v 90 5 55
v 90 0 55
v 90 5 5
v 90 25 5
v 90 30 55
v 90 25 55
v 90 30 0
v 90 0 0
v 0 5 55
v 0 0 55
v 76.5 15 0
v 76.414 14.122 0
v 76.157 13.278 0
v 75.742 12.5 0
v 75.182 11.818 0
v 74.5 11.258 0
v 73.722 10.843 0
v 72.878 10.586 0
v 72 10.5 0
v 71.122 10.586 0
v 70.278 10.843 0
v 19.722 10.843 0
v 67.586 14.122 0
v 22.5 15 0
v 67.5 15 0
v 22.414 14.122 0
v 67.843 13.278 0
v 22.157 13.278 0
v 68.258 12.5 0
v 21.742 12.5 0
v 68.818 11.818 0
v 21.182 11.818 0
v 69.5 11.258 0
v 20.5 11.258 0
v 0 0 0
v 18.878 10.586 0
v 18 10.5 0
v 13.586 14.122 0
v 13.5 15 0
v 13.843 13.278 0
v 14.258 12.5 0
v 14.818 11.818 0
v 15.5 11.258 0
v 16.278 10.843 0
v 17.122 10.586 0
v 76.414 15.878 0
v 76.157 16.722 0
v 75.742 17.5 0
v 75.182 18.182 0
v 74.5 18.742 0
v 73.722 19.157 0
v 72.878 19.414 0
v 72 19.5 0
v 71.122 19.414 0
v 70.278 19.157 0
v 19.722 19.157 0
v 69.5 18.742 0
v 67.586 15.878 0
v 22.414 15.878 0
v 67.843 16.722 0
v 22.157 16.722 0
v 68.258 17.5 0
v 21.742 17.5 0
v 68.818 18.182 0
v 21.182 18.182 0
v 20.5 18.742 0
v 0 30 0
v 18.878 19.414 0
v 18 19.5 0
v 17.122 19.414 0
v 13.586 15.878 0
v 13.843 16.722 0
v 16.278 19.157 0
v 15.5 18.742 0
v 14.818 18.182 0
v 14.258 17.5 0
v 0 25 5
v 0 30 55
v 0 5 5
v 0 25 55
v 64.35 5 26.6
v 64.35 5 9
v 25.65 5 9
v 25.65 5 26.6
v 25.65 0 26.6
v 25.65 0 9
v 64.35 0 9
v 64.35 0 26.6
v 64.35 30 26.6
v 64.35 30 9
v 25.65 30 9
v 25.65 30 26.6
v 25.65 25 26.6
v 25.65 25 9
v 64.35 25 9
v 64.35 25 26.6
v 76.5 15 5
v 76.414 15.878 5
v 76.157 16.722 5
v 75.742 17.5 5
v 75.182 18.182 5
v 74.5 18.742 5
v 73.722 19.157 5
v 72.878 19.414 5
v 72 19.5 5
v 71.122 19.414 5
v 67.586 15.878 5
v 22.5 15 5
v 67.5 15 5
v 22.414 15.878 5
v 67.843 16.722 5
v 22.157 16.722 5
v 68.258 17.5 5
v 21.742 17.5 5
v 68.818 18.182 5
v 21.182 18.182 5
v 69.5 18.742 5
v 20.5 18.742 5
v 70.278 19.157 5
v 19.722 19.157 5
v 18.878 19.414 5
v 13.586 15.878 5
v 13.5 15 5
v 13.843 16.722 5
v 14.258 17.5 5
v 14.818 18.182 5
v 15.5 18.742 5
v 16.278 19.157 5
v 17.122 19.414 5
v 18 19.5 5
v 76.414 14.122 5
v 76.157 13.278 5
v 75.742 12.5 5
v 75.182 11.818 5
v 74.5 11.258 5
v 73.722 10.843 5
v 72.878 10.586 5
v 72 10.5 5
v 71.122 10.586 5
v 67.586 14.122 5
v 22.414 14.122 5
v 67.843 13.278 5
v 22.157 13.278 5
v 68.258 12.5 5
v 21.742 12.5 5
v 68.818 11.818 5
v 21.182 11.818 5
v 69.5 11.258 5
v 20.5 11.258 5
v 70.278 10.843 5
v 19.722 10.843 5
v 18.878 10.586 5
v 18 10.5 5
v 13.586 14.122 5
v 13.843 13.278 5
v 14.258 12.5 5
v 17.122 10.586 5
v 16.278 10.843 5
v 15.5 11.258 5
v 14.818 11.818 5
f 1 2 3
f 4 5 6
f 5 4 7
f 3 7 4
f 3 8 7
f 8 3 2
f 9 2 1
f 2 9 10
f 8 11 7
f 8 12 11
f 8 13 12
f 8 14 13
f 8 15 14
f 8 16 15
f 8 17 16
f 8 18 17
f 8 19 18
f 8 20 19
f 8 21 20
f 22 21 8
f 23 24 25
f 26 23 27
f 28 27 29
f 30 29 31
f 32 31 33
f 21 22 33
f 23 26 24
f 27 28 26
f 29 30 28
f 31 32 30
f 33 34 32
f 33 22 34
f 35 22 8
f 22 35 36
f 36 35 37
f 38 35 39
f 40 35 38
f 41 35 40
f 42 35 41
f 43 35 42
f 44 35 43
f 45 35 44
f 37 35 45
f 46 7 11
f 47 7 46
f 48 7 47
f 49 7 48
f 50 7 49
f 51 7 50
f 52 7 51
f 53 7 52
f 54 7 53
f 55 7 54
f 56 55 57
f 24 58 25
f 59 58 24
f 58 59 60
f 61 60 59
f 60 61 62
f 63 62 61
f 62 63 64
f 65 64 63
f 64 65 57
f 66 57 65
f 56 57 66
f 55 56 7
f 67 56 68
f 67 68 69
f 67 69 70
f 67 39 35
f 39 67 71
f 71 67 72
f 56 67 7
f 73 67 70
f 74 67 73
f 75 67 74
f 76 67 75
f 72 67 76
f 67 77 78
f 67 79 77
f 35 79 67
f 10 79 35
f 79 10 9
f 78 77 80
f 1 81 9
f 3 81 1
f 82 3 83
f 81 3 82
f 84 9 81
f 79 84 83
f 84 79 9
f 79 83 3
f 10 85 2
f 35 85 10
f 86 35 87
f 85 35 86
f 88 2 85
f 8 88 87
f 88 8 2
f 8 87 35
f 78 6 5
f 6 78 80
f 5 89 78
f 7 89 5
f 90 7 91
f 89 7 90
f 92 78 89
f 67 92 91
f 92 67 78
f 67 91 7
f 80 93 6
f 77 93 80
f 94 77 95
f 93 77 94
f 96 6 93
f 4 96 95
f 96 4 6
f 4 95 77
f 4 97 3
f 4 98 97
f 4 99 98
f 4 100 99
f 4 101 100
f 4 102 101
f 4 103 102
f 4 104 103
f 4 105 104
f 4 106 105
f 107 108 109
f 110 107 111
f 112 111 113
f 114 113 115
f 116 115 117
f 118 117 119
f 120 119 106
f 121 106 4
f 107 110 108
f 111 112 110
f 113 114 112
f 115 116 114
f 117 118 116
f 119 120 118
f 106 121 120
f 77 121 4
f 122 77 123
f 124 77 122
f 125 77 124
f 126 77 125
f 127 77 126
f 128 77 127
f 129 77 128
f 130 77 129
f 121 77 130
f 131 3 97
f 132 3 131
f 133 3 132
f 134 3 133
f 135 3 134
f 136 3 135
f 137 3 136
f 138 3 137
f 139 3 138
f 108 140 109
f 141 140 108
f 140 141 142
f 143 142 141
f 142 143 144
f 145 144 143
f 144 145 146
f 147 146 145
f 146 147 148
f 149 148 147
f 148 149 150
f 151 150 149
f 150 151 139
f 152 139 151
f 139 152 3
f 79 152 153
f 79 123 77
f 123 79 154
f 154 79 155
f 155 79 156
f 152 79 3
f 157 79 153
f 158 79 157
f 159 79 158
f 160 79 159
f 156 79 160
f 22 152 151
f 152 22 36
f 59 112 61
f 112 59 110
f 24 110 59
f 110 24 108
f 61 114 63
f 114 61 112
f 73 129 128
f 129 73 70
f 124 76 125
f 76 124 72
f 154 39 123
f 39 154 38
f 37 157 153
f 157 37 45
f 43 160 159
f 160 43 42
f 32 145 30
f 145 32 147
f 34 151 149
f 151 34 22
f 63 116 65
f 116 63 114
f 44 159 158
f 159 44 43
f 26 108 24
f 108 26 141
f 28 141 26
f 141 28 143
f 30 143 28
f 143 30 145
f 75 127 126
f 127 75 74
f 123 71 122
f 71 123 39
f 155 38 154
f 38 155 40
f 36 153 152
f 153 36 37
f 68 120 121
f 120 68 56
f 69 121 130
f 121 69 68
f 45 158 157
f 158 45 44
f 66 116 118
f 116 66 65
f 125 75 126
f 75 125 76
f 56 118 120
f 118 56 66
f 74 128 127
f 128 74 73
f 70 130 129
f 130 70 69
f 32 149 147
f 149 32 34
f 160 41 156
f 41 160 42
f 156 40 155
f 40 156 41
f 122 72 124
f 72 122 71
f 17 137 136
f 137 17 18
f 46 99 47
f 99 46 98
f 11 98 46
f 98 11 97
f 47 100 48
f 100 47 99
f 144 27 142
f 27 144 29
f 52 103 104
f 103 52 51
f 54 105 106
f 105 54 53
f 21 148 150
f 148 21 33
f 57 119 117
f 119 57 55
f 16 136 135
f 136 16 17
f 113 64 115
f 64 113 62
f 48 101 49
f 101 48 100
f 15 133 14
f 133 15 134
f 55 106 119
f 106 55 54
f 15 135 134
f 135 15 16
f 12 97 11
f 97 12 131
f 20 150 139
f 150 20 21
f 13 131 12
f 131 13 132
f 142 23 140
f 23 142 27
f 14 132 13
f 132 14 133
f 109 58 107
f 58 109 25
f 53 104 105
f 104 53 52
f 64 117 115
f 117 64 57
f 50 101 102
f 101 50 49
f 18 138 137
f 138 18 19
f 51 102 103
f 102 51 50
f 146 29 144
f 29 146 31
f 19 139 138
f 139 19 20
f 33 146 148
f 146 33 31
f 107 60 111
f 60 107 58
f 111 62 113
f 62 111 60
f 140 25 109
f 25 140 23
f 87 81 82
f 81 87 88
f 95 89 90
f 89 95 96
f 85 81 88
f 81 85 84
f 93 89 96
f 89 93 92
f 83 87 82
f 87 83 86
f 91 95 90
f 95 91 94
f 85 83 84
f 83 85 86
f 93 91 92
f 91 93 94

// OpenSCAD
$fn = 32;

// ----------------------------------------------------------------------
// U-bracket: 90 x 30 x 55 mm
// ----------------------------------------------------------------------

// --- parameters (mm) ---
base_len = 90;            // outer length, X
channel_w = 30;           // outer width, Y
upright_h = 55;           // upright height, Z
mat_t = 5;                // wall thickness
hole_d = 9;               // clearance for M8
window_l = 38.7;          // window length
window_h = 17.6;          // window height

module hole_z(px, py) {
  translate([px, py, -2.5]) cylinder(h = mat_t + 5, d = hole_d);
}
module hole_y_pz(pz) {
  /* through both uprights along Y */
  translate([0, -2.5, pz]) rotate([-90, 0, 0]) cylinder(h = channel_w + 5, d = hole_d);
}

module base() {
  cube([base_len, channel_w, mat_t]);
}

module uprights() {
  cube([base_len, mat_t, upright_h]);
  translate([0, channel_w - mat_t, 0]) cube([base_len, mat_t, upright_h]);
}

difference() {
  union() {
    base();
    uprights();
  }
  hole_z(18, 15);
  hole_z(72, 15);
  /* lightening window through both uprights */
  translate([base_len / 2 - window_l / 2, -1, mat_t + 4])
    cube([window_l, channel_w + 2, window_h]);
}
